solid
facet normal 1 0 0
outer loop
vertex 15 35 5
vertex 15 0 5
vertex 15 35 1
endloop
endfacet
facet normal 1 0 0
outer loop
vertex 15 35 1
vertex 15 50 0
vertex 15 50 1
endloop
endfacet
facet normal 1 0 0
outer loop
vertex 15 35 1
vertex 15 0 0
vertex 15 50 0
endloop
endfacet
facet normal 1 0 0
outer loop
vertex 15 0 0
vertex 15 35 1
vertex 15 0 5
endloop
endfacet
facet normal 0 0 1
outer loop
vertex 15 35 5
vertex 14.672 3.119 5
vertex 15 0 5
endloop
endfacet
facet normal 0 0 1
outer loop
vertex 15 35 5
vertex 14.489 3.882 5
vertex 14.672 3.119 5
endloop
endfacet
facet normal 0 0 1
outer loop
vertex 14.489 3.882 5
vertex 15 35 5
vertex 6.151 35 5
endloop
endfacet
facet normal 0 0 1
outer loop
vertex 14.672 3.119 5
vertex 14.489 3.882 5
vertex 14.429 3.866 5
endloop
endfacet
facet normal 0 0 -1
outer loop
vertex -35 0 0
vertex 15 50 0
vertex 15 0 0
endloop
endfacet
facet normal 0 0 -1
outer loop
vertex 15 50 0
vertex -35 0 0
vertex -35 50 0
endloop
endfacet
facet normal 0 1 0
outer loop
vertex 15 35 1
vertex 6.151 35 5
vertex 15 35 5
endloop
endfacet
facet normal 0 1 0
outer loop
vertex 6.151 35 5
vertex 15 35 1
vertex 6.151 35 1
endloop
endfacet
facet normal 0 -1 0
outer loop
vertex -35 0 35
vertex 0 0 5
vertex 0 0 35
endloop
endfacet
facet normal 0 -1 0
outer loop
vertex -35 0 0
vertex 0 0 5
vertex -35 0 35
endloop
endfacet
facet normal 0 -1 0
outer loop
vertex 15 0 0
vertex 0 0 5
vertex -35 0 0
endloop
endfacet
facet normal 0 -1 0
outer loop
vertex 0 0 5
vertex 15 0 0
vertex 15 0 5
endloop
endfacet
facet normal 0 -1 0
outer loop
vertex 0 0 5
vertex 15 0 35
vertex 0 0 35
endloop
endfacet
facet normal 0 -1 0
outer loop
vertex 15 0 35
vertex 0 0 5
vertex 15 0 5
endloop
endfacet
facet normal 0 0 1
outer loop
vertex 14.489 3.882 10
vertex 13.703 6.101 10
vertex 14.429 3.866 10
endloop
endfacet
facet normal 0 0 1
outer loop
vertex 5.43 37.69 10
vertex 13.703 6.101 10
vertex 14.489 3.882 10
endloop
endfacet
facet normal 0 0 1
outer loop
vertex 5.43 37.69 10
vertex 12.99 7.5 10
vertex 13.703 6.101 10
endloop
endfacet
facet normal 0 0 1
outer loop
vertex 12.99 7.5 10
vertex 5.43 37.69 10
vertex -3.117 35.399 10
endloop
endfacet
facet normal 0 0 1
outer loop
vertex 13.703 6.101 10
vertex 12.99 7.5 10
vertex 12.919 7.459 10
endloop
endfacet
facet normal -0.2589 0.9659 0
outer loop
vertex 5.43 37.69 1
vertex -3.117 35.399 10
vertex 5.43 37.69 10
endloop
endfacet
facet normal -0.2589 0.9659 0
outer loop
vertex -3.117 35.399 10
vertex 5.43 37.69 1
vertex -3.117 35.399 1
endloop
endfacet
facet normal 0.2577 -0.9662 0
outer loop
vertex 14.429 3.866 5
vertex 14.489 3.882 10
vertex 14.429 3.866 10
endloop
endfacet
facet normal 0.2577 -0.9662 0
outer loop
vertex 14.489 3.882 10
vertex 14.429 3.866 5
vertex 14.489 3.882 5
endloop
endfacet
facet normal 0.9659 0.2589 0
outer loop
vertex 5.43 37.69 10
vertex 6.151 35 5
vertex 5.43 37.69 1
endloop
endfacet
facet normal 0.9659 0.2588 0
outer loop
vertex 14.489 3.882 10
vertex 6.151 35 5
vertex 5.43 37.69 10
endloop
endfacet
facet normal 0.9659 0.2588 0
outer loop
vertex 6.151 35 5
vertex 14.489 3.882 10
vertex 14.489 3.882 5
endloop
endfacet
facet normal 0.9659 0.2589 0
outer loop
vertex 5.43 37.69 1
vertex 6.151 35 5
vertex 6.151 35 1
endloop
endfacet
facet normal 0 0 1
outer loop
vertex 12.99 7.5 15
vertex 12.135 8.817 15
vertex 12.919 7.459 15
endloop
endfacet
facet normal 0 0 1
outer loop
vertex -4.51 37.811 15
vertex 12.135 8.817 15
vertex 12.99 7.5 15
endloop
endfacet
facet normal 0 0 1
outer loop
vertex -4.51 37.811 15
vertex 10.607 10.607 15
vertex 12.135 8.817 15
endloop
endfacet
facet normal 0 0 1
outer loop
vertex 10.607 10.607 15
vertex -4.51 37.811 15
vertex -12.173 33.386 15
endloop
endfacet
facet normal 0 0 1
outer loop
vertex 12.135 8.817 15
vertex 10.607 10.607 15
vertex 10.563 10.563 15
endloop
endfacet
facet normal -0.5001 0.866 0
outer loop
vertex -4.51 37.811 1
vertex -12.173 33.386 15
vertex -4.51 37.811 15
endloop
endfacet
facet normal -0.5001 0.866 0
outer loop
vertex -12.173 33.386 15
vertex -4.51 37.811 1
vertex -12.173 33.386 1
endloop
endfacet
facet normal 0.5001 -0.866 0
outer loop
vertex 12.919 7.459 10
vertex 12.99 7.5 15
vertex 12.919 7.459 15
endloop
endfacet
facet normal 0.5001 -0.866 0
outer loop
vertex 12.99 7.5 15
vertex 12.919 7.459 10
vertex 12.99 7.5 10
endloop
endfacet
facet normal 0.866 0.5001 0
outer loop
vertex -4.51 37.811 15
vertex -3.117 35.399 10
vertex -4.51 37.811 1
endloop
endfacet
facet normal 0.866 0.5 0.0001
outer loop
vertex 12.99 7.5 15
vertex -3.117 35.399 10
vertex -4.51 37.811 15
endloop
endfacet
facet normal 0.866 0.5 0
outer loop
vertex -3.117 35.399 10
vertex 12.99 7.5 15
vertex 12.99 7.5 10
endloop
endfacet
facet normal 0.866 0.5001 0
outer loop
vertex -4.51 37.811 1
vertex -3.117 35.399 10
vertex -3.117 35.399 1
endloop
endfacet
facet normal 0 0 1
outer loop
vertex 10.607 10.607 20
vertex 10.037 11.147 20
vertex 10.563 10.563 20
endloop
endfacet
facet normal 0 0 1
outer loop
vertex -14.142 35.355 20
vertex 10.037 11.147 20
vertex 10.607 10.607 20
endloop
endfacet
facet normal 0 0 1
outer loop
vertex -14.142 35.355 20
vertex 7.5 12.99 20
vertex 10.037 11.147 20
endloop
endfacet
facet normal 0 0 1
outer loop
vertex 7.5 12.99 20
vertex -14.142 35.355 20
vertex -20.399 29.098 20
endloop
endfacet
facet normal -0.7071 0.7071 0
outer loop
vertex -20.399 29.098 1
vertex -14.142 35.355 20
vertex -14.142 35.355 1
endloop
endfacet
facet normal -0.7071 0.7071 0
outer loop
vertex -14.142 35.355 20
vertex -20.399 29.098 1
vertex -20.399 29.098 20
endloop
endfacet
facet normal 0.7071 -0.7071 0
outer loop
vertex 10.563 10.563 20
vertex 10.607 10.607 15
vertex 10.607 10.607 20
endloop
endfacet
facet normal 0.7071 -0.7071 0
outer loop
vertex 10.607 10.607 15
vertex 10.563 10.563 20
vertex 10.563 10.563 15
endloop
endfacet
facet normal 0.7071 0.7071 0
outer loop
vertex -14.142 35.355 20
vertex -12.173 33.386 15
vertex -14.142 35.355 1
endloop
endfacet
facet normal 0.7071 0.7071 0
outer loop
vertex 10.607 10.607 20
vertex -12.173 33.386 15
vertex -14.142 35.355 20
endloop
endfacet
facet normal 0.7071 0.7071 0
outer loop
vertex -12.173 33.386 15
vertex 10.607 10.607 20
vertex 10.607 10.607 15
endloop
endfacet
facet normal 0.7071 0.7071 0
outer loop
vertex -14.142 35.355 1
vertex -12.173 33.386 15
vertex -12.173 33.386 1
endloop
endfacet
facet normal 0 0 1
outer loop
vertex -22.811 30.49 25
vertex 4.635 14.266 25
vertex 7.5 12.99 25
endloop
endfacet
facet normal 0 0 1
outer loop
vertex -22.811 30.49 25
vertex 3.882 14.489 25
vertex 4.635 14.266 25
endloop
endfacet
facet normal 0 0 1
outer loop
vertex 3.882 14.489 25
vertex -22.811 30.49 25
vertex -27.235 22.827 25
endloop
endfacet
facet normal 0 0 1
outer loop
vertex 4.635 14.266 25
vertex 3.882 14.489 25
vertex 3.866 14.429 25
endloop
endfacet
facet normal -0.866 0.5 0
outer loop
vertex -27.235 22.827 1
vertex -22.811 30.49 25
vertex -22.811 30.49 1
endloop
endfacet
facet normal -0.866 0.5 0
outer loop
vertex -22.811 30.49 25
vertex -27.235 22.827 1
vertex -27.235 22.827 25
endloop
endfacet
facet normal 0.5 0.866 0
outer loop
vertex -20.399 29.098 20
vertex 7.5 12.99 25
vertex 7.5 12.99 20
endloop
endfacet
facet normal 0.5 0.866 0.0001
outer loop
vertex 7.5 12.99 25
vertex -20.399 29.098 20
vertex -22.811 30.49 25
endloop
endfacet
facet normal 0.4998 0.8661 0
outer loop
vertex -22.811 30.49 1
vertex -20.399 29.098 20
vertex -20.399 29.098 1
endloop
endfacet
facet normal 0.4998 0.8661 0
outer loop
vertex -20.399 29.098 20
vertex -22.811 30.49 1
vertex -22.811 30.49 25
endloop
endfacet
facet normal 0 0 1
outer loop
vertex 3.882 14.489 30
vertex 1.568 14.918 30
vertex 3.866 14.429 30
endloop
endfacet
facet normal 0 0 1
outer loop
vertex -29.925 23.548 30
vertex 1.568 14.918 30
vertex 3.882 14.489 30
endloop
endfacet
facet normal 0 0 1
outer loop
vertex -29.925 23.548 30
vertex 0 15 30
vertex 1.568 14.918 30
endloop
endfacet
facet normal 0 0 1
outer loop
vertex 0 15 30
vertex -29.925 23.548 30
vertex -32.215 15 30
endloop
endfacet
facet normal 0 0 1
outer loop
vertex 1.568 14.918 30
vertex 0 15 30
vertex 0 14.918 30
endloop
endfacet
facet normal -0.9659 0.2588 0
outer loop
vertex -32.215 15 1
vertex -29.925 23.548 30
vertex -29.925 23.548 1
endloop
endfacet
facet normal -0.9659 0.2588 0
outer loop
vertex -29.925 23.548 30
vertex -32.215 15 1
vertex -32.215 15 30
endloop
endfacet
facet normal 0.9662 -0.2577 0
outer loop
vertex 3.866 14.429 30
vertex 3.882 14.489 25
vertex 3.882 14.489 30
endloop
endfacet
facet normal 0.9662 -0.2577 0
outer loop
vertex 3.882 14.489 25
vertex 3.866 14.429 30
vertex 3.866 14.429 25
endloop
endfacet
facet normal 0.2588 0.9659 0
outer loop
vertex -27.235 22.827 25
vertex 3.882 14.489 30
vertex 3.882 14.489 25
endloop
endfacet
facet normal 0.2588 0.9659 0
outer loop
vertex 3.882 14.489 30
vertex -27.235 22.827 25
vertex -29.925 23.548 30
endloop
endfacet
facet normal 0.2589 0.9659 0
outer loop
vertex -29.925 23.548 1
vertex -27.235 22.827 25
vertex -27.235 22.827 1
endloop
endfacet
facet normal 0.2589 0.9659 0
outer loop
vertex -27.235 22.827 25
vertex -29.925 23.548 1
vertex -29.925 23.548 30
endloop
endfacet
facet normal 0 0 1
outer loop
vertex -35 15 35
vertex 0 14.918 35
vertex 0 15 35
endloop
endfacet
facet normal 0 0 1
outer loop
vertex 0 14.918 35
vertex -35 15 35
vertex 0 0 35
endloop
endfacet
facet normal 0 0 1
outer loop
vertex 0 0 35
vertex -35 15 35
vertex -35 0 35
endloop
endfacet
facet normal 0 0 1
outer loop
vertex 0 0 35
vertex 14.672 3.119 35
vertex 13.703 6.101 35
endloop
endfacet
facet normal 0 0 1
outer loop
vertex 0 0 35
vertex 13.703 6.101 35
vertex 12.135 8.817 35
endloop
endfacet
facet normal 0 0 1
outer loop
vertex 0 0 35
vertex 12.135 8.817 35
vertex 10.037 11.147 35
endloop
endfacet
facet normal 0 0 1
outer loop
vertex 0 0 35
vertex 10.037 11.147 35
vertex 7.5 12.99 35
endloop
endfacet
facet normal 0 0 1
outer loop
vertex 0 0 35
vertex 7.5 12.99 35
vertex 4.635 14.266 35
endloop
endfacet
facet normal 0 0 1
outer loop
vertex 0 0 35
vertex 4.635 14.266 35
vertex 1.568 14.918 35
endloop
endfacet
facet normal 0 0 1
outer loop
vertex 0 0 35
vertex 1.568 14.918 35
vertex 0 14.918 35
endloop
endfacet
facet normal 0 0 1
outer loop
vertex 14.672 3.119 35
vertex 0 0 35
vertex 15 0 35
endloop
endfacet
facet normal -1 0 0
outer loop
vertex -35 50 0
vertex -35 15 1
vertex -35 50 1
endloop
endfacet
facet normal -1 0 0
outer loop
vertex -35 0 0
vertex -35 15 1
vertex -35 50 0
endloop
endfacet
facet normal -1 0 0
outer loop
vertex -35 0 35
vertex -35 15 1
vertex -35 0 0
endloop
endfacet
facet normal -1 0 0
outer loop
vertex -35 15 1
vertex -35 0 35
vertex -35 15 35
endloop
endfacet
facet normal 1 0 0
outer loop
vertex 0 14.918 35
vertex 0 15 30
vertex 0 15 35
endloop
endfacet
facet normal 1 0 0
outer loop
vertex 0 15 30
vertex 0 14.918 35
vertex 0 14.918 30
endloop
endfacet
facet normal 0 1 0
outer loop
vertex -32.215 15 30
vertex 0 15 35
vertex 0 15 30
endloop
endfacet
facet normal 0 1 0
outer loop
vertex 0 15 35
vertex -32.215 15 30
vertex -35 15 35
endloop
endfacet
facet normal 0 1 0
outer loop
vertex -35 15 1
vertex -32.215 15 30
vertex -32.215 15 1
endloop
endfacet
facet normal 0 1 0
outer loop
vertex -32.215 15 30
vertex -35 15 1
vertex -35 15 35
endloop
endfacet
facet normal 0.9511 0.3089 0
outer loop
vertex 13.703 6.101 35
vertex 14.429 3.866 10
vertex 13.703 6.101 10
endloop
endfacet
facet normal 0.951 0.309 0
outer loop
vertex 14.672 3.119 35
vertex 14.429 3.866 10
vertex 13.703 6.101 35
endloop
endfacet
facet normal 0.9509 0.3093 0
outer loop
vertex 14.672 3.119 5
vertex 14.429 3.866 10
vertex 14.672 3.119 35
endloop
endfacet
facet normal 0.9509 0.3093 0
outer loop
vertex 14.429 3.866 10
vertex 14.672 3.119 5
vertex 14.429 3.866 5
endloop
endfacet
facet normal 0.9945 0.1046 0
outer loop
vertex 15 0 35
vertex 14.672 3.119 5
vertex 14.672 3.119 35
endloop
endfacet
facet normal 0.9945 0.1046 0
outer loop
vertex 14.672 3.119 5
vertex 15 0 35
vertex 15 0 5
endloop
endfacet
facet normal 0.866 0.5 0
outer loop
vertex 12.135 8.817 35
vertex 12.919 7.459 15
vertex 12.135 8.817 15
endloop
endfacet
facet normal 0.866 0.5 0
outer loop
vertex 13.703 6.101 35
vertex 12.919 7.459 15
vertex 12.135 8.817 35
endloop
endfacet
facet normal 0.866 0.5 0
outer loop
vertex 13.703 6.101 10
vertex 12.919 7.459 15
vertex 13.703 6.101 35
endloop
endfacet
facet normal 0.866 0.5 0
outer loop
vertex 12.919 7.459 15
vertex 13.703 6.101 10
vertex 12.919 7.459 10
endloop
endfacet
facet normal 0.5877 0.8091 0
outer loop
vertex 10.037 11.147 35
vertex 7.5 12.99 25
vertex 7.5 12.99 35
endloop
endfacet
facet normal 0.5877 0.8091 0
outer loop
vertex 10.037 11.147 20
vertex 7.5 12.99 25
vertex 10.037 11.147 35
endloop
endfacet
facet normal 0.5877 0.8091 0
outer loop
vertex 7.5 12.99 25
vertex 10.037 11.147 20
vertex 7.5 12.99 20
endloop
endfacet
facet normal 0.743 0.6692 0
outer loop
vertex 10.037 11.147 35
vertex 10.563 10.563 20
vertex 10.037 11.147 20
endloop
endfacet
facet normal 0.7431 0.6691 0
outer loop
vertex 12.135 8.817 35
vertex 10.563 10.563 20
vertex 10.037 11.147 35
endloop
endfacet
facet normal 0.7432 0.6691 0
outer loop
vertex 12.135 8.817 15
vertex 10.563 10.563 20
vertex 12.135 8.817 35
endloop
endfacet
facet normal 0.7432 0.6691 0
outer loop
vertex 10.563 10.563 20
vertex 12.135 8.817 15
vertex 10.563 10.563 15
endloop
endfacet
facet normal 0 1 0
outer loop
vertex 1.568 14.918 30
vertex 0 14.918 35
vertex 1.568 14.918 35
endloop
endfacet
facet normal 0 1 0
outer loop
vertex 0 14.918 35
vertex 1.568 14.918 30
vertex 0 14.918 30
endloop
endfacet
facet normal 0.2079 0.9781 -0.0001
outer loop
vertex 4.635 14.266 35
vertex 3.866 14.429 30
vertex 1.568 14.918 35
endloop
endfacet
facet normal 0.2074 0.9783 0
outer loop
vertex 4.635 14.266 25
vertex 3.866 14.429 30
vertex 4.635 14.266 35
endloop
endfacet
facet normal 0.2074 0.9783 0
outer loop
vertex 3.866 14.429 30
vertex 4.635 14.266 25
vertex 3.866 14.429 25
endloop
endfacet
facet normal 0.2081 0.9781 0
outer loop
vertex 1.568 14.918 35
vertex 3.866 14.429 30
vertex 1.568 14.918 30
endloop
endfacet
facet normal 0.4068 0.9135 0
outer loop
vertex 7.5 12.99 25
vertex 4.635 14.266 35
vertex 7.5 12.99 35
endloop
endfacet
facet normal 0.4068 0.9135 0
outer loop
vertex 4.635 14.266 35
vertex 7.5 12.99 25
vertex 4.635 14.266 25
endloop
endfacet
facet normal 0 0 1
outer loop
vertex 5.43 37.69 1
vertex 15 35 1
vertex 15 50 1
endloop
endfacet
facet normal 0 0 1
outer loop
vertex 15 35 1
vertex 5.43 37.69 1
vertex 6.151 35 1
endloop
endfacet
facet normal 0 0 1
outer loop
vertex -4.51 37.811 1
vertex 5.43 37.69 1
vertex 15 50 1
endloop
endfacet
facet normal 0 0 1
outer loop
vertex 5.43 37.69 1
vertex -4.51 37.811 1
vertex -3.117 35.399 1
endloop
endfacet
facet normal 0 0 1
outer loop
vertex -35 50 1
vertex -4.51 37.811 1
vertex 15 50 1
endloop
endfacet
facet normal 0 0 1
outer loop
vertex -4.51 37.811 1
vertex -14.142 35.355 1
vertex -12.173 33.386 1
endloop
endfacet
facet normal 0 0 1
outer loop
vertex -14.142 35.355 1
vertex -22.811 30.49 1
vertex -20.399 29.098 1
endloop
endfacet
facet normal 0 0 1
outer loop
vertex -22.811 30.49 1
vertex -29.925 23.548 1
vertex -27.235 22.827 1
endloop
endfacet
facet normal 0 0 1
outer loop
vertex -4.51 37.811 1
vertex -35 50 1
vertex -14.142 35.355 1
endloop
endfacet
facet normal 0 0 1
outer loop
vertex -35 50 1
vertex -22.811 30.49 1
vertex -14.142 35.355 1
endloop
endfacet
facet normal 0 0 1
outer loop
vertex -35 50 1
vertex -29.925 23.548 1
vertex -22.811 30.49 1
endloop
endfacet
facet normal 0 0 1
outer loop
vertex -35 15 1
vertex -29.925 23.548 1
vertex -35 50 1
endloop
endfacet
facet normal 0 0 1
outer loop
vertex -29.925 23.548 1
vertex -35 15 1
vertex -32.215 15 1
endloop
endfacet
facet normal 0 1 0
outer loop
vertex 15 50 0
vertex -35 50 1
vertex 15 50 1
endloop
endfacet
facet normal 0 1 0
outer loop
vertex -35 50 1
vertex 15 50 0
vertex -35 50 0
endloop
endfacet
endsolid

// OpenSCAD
nbm=6; // nombre de marches
lm=35; // largeur d'une marche
hm=5; // hauteur d'une marche
pm=15; //profondeur d'une marche
rc=15; //rayon du cylindre
rotm=15; //rotation d'une marche
for (i=[0:nbm]){

rotate([0,0,rotm*i]){
cube([pm,lm,hm*(i+1)],center=false);
}
}

difference(){
cylinder(r=rc,h=hm*(nbm+1));
translate([-rc,-rc*2,0]){
cube([rc*2,rc*2,hm*(nbm+2)],center=false);
}   
    }
translate([-35,0,0]){
    cube([50,50,1]);
}
